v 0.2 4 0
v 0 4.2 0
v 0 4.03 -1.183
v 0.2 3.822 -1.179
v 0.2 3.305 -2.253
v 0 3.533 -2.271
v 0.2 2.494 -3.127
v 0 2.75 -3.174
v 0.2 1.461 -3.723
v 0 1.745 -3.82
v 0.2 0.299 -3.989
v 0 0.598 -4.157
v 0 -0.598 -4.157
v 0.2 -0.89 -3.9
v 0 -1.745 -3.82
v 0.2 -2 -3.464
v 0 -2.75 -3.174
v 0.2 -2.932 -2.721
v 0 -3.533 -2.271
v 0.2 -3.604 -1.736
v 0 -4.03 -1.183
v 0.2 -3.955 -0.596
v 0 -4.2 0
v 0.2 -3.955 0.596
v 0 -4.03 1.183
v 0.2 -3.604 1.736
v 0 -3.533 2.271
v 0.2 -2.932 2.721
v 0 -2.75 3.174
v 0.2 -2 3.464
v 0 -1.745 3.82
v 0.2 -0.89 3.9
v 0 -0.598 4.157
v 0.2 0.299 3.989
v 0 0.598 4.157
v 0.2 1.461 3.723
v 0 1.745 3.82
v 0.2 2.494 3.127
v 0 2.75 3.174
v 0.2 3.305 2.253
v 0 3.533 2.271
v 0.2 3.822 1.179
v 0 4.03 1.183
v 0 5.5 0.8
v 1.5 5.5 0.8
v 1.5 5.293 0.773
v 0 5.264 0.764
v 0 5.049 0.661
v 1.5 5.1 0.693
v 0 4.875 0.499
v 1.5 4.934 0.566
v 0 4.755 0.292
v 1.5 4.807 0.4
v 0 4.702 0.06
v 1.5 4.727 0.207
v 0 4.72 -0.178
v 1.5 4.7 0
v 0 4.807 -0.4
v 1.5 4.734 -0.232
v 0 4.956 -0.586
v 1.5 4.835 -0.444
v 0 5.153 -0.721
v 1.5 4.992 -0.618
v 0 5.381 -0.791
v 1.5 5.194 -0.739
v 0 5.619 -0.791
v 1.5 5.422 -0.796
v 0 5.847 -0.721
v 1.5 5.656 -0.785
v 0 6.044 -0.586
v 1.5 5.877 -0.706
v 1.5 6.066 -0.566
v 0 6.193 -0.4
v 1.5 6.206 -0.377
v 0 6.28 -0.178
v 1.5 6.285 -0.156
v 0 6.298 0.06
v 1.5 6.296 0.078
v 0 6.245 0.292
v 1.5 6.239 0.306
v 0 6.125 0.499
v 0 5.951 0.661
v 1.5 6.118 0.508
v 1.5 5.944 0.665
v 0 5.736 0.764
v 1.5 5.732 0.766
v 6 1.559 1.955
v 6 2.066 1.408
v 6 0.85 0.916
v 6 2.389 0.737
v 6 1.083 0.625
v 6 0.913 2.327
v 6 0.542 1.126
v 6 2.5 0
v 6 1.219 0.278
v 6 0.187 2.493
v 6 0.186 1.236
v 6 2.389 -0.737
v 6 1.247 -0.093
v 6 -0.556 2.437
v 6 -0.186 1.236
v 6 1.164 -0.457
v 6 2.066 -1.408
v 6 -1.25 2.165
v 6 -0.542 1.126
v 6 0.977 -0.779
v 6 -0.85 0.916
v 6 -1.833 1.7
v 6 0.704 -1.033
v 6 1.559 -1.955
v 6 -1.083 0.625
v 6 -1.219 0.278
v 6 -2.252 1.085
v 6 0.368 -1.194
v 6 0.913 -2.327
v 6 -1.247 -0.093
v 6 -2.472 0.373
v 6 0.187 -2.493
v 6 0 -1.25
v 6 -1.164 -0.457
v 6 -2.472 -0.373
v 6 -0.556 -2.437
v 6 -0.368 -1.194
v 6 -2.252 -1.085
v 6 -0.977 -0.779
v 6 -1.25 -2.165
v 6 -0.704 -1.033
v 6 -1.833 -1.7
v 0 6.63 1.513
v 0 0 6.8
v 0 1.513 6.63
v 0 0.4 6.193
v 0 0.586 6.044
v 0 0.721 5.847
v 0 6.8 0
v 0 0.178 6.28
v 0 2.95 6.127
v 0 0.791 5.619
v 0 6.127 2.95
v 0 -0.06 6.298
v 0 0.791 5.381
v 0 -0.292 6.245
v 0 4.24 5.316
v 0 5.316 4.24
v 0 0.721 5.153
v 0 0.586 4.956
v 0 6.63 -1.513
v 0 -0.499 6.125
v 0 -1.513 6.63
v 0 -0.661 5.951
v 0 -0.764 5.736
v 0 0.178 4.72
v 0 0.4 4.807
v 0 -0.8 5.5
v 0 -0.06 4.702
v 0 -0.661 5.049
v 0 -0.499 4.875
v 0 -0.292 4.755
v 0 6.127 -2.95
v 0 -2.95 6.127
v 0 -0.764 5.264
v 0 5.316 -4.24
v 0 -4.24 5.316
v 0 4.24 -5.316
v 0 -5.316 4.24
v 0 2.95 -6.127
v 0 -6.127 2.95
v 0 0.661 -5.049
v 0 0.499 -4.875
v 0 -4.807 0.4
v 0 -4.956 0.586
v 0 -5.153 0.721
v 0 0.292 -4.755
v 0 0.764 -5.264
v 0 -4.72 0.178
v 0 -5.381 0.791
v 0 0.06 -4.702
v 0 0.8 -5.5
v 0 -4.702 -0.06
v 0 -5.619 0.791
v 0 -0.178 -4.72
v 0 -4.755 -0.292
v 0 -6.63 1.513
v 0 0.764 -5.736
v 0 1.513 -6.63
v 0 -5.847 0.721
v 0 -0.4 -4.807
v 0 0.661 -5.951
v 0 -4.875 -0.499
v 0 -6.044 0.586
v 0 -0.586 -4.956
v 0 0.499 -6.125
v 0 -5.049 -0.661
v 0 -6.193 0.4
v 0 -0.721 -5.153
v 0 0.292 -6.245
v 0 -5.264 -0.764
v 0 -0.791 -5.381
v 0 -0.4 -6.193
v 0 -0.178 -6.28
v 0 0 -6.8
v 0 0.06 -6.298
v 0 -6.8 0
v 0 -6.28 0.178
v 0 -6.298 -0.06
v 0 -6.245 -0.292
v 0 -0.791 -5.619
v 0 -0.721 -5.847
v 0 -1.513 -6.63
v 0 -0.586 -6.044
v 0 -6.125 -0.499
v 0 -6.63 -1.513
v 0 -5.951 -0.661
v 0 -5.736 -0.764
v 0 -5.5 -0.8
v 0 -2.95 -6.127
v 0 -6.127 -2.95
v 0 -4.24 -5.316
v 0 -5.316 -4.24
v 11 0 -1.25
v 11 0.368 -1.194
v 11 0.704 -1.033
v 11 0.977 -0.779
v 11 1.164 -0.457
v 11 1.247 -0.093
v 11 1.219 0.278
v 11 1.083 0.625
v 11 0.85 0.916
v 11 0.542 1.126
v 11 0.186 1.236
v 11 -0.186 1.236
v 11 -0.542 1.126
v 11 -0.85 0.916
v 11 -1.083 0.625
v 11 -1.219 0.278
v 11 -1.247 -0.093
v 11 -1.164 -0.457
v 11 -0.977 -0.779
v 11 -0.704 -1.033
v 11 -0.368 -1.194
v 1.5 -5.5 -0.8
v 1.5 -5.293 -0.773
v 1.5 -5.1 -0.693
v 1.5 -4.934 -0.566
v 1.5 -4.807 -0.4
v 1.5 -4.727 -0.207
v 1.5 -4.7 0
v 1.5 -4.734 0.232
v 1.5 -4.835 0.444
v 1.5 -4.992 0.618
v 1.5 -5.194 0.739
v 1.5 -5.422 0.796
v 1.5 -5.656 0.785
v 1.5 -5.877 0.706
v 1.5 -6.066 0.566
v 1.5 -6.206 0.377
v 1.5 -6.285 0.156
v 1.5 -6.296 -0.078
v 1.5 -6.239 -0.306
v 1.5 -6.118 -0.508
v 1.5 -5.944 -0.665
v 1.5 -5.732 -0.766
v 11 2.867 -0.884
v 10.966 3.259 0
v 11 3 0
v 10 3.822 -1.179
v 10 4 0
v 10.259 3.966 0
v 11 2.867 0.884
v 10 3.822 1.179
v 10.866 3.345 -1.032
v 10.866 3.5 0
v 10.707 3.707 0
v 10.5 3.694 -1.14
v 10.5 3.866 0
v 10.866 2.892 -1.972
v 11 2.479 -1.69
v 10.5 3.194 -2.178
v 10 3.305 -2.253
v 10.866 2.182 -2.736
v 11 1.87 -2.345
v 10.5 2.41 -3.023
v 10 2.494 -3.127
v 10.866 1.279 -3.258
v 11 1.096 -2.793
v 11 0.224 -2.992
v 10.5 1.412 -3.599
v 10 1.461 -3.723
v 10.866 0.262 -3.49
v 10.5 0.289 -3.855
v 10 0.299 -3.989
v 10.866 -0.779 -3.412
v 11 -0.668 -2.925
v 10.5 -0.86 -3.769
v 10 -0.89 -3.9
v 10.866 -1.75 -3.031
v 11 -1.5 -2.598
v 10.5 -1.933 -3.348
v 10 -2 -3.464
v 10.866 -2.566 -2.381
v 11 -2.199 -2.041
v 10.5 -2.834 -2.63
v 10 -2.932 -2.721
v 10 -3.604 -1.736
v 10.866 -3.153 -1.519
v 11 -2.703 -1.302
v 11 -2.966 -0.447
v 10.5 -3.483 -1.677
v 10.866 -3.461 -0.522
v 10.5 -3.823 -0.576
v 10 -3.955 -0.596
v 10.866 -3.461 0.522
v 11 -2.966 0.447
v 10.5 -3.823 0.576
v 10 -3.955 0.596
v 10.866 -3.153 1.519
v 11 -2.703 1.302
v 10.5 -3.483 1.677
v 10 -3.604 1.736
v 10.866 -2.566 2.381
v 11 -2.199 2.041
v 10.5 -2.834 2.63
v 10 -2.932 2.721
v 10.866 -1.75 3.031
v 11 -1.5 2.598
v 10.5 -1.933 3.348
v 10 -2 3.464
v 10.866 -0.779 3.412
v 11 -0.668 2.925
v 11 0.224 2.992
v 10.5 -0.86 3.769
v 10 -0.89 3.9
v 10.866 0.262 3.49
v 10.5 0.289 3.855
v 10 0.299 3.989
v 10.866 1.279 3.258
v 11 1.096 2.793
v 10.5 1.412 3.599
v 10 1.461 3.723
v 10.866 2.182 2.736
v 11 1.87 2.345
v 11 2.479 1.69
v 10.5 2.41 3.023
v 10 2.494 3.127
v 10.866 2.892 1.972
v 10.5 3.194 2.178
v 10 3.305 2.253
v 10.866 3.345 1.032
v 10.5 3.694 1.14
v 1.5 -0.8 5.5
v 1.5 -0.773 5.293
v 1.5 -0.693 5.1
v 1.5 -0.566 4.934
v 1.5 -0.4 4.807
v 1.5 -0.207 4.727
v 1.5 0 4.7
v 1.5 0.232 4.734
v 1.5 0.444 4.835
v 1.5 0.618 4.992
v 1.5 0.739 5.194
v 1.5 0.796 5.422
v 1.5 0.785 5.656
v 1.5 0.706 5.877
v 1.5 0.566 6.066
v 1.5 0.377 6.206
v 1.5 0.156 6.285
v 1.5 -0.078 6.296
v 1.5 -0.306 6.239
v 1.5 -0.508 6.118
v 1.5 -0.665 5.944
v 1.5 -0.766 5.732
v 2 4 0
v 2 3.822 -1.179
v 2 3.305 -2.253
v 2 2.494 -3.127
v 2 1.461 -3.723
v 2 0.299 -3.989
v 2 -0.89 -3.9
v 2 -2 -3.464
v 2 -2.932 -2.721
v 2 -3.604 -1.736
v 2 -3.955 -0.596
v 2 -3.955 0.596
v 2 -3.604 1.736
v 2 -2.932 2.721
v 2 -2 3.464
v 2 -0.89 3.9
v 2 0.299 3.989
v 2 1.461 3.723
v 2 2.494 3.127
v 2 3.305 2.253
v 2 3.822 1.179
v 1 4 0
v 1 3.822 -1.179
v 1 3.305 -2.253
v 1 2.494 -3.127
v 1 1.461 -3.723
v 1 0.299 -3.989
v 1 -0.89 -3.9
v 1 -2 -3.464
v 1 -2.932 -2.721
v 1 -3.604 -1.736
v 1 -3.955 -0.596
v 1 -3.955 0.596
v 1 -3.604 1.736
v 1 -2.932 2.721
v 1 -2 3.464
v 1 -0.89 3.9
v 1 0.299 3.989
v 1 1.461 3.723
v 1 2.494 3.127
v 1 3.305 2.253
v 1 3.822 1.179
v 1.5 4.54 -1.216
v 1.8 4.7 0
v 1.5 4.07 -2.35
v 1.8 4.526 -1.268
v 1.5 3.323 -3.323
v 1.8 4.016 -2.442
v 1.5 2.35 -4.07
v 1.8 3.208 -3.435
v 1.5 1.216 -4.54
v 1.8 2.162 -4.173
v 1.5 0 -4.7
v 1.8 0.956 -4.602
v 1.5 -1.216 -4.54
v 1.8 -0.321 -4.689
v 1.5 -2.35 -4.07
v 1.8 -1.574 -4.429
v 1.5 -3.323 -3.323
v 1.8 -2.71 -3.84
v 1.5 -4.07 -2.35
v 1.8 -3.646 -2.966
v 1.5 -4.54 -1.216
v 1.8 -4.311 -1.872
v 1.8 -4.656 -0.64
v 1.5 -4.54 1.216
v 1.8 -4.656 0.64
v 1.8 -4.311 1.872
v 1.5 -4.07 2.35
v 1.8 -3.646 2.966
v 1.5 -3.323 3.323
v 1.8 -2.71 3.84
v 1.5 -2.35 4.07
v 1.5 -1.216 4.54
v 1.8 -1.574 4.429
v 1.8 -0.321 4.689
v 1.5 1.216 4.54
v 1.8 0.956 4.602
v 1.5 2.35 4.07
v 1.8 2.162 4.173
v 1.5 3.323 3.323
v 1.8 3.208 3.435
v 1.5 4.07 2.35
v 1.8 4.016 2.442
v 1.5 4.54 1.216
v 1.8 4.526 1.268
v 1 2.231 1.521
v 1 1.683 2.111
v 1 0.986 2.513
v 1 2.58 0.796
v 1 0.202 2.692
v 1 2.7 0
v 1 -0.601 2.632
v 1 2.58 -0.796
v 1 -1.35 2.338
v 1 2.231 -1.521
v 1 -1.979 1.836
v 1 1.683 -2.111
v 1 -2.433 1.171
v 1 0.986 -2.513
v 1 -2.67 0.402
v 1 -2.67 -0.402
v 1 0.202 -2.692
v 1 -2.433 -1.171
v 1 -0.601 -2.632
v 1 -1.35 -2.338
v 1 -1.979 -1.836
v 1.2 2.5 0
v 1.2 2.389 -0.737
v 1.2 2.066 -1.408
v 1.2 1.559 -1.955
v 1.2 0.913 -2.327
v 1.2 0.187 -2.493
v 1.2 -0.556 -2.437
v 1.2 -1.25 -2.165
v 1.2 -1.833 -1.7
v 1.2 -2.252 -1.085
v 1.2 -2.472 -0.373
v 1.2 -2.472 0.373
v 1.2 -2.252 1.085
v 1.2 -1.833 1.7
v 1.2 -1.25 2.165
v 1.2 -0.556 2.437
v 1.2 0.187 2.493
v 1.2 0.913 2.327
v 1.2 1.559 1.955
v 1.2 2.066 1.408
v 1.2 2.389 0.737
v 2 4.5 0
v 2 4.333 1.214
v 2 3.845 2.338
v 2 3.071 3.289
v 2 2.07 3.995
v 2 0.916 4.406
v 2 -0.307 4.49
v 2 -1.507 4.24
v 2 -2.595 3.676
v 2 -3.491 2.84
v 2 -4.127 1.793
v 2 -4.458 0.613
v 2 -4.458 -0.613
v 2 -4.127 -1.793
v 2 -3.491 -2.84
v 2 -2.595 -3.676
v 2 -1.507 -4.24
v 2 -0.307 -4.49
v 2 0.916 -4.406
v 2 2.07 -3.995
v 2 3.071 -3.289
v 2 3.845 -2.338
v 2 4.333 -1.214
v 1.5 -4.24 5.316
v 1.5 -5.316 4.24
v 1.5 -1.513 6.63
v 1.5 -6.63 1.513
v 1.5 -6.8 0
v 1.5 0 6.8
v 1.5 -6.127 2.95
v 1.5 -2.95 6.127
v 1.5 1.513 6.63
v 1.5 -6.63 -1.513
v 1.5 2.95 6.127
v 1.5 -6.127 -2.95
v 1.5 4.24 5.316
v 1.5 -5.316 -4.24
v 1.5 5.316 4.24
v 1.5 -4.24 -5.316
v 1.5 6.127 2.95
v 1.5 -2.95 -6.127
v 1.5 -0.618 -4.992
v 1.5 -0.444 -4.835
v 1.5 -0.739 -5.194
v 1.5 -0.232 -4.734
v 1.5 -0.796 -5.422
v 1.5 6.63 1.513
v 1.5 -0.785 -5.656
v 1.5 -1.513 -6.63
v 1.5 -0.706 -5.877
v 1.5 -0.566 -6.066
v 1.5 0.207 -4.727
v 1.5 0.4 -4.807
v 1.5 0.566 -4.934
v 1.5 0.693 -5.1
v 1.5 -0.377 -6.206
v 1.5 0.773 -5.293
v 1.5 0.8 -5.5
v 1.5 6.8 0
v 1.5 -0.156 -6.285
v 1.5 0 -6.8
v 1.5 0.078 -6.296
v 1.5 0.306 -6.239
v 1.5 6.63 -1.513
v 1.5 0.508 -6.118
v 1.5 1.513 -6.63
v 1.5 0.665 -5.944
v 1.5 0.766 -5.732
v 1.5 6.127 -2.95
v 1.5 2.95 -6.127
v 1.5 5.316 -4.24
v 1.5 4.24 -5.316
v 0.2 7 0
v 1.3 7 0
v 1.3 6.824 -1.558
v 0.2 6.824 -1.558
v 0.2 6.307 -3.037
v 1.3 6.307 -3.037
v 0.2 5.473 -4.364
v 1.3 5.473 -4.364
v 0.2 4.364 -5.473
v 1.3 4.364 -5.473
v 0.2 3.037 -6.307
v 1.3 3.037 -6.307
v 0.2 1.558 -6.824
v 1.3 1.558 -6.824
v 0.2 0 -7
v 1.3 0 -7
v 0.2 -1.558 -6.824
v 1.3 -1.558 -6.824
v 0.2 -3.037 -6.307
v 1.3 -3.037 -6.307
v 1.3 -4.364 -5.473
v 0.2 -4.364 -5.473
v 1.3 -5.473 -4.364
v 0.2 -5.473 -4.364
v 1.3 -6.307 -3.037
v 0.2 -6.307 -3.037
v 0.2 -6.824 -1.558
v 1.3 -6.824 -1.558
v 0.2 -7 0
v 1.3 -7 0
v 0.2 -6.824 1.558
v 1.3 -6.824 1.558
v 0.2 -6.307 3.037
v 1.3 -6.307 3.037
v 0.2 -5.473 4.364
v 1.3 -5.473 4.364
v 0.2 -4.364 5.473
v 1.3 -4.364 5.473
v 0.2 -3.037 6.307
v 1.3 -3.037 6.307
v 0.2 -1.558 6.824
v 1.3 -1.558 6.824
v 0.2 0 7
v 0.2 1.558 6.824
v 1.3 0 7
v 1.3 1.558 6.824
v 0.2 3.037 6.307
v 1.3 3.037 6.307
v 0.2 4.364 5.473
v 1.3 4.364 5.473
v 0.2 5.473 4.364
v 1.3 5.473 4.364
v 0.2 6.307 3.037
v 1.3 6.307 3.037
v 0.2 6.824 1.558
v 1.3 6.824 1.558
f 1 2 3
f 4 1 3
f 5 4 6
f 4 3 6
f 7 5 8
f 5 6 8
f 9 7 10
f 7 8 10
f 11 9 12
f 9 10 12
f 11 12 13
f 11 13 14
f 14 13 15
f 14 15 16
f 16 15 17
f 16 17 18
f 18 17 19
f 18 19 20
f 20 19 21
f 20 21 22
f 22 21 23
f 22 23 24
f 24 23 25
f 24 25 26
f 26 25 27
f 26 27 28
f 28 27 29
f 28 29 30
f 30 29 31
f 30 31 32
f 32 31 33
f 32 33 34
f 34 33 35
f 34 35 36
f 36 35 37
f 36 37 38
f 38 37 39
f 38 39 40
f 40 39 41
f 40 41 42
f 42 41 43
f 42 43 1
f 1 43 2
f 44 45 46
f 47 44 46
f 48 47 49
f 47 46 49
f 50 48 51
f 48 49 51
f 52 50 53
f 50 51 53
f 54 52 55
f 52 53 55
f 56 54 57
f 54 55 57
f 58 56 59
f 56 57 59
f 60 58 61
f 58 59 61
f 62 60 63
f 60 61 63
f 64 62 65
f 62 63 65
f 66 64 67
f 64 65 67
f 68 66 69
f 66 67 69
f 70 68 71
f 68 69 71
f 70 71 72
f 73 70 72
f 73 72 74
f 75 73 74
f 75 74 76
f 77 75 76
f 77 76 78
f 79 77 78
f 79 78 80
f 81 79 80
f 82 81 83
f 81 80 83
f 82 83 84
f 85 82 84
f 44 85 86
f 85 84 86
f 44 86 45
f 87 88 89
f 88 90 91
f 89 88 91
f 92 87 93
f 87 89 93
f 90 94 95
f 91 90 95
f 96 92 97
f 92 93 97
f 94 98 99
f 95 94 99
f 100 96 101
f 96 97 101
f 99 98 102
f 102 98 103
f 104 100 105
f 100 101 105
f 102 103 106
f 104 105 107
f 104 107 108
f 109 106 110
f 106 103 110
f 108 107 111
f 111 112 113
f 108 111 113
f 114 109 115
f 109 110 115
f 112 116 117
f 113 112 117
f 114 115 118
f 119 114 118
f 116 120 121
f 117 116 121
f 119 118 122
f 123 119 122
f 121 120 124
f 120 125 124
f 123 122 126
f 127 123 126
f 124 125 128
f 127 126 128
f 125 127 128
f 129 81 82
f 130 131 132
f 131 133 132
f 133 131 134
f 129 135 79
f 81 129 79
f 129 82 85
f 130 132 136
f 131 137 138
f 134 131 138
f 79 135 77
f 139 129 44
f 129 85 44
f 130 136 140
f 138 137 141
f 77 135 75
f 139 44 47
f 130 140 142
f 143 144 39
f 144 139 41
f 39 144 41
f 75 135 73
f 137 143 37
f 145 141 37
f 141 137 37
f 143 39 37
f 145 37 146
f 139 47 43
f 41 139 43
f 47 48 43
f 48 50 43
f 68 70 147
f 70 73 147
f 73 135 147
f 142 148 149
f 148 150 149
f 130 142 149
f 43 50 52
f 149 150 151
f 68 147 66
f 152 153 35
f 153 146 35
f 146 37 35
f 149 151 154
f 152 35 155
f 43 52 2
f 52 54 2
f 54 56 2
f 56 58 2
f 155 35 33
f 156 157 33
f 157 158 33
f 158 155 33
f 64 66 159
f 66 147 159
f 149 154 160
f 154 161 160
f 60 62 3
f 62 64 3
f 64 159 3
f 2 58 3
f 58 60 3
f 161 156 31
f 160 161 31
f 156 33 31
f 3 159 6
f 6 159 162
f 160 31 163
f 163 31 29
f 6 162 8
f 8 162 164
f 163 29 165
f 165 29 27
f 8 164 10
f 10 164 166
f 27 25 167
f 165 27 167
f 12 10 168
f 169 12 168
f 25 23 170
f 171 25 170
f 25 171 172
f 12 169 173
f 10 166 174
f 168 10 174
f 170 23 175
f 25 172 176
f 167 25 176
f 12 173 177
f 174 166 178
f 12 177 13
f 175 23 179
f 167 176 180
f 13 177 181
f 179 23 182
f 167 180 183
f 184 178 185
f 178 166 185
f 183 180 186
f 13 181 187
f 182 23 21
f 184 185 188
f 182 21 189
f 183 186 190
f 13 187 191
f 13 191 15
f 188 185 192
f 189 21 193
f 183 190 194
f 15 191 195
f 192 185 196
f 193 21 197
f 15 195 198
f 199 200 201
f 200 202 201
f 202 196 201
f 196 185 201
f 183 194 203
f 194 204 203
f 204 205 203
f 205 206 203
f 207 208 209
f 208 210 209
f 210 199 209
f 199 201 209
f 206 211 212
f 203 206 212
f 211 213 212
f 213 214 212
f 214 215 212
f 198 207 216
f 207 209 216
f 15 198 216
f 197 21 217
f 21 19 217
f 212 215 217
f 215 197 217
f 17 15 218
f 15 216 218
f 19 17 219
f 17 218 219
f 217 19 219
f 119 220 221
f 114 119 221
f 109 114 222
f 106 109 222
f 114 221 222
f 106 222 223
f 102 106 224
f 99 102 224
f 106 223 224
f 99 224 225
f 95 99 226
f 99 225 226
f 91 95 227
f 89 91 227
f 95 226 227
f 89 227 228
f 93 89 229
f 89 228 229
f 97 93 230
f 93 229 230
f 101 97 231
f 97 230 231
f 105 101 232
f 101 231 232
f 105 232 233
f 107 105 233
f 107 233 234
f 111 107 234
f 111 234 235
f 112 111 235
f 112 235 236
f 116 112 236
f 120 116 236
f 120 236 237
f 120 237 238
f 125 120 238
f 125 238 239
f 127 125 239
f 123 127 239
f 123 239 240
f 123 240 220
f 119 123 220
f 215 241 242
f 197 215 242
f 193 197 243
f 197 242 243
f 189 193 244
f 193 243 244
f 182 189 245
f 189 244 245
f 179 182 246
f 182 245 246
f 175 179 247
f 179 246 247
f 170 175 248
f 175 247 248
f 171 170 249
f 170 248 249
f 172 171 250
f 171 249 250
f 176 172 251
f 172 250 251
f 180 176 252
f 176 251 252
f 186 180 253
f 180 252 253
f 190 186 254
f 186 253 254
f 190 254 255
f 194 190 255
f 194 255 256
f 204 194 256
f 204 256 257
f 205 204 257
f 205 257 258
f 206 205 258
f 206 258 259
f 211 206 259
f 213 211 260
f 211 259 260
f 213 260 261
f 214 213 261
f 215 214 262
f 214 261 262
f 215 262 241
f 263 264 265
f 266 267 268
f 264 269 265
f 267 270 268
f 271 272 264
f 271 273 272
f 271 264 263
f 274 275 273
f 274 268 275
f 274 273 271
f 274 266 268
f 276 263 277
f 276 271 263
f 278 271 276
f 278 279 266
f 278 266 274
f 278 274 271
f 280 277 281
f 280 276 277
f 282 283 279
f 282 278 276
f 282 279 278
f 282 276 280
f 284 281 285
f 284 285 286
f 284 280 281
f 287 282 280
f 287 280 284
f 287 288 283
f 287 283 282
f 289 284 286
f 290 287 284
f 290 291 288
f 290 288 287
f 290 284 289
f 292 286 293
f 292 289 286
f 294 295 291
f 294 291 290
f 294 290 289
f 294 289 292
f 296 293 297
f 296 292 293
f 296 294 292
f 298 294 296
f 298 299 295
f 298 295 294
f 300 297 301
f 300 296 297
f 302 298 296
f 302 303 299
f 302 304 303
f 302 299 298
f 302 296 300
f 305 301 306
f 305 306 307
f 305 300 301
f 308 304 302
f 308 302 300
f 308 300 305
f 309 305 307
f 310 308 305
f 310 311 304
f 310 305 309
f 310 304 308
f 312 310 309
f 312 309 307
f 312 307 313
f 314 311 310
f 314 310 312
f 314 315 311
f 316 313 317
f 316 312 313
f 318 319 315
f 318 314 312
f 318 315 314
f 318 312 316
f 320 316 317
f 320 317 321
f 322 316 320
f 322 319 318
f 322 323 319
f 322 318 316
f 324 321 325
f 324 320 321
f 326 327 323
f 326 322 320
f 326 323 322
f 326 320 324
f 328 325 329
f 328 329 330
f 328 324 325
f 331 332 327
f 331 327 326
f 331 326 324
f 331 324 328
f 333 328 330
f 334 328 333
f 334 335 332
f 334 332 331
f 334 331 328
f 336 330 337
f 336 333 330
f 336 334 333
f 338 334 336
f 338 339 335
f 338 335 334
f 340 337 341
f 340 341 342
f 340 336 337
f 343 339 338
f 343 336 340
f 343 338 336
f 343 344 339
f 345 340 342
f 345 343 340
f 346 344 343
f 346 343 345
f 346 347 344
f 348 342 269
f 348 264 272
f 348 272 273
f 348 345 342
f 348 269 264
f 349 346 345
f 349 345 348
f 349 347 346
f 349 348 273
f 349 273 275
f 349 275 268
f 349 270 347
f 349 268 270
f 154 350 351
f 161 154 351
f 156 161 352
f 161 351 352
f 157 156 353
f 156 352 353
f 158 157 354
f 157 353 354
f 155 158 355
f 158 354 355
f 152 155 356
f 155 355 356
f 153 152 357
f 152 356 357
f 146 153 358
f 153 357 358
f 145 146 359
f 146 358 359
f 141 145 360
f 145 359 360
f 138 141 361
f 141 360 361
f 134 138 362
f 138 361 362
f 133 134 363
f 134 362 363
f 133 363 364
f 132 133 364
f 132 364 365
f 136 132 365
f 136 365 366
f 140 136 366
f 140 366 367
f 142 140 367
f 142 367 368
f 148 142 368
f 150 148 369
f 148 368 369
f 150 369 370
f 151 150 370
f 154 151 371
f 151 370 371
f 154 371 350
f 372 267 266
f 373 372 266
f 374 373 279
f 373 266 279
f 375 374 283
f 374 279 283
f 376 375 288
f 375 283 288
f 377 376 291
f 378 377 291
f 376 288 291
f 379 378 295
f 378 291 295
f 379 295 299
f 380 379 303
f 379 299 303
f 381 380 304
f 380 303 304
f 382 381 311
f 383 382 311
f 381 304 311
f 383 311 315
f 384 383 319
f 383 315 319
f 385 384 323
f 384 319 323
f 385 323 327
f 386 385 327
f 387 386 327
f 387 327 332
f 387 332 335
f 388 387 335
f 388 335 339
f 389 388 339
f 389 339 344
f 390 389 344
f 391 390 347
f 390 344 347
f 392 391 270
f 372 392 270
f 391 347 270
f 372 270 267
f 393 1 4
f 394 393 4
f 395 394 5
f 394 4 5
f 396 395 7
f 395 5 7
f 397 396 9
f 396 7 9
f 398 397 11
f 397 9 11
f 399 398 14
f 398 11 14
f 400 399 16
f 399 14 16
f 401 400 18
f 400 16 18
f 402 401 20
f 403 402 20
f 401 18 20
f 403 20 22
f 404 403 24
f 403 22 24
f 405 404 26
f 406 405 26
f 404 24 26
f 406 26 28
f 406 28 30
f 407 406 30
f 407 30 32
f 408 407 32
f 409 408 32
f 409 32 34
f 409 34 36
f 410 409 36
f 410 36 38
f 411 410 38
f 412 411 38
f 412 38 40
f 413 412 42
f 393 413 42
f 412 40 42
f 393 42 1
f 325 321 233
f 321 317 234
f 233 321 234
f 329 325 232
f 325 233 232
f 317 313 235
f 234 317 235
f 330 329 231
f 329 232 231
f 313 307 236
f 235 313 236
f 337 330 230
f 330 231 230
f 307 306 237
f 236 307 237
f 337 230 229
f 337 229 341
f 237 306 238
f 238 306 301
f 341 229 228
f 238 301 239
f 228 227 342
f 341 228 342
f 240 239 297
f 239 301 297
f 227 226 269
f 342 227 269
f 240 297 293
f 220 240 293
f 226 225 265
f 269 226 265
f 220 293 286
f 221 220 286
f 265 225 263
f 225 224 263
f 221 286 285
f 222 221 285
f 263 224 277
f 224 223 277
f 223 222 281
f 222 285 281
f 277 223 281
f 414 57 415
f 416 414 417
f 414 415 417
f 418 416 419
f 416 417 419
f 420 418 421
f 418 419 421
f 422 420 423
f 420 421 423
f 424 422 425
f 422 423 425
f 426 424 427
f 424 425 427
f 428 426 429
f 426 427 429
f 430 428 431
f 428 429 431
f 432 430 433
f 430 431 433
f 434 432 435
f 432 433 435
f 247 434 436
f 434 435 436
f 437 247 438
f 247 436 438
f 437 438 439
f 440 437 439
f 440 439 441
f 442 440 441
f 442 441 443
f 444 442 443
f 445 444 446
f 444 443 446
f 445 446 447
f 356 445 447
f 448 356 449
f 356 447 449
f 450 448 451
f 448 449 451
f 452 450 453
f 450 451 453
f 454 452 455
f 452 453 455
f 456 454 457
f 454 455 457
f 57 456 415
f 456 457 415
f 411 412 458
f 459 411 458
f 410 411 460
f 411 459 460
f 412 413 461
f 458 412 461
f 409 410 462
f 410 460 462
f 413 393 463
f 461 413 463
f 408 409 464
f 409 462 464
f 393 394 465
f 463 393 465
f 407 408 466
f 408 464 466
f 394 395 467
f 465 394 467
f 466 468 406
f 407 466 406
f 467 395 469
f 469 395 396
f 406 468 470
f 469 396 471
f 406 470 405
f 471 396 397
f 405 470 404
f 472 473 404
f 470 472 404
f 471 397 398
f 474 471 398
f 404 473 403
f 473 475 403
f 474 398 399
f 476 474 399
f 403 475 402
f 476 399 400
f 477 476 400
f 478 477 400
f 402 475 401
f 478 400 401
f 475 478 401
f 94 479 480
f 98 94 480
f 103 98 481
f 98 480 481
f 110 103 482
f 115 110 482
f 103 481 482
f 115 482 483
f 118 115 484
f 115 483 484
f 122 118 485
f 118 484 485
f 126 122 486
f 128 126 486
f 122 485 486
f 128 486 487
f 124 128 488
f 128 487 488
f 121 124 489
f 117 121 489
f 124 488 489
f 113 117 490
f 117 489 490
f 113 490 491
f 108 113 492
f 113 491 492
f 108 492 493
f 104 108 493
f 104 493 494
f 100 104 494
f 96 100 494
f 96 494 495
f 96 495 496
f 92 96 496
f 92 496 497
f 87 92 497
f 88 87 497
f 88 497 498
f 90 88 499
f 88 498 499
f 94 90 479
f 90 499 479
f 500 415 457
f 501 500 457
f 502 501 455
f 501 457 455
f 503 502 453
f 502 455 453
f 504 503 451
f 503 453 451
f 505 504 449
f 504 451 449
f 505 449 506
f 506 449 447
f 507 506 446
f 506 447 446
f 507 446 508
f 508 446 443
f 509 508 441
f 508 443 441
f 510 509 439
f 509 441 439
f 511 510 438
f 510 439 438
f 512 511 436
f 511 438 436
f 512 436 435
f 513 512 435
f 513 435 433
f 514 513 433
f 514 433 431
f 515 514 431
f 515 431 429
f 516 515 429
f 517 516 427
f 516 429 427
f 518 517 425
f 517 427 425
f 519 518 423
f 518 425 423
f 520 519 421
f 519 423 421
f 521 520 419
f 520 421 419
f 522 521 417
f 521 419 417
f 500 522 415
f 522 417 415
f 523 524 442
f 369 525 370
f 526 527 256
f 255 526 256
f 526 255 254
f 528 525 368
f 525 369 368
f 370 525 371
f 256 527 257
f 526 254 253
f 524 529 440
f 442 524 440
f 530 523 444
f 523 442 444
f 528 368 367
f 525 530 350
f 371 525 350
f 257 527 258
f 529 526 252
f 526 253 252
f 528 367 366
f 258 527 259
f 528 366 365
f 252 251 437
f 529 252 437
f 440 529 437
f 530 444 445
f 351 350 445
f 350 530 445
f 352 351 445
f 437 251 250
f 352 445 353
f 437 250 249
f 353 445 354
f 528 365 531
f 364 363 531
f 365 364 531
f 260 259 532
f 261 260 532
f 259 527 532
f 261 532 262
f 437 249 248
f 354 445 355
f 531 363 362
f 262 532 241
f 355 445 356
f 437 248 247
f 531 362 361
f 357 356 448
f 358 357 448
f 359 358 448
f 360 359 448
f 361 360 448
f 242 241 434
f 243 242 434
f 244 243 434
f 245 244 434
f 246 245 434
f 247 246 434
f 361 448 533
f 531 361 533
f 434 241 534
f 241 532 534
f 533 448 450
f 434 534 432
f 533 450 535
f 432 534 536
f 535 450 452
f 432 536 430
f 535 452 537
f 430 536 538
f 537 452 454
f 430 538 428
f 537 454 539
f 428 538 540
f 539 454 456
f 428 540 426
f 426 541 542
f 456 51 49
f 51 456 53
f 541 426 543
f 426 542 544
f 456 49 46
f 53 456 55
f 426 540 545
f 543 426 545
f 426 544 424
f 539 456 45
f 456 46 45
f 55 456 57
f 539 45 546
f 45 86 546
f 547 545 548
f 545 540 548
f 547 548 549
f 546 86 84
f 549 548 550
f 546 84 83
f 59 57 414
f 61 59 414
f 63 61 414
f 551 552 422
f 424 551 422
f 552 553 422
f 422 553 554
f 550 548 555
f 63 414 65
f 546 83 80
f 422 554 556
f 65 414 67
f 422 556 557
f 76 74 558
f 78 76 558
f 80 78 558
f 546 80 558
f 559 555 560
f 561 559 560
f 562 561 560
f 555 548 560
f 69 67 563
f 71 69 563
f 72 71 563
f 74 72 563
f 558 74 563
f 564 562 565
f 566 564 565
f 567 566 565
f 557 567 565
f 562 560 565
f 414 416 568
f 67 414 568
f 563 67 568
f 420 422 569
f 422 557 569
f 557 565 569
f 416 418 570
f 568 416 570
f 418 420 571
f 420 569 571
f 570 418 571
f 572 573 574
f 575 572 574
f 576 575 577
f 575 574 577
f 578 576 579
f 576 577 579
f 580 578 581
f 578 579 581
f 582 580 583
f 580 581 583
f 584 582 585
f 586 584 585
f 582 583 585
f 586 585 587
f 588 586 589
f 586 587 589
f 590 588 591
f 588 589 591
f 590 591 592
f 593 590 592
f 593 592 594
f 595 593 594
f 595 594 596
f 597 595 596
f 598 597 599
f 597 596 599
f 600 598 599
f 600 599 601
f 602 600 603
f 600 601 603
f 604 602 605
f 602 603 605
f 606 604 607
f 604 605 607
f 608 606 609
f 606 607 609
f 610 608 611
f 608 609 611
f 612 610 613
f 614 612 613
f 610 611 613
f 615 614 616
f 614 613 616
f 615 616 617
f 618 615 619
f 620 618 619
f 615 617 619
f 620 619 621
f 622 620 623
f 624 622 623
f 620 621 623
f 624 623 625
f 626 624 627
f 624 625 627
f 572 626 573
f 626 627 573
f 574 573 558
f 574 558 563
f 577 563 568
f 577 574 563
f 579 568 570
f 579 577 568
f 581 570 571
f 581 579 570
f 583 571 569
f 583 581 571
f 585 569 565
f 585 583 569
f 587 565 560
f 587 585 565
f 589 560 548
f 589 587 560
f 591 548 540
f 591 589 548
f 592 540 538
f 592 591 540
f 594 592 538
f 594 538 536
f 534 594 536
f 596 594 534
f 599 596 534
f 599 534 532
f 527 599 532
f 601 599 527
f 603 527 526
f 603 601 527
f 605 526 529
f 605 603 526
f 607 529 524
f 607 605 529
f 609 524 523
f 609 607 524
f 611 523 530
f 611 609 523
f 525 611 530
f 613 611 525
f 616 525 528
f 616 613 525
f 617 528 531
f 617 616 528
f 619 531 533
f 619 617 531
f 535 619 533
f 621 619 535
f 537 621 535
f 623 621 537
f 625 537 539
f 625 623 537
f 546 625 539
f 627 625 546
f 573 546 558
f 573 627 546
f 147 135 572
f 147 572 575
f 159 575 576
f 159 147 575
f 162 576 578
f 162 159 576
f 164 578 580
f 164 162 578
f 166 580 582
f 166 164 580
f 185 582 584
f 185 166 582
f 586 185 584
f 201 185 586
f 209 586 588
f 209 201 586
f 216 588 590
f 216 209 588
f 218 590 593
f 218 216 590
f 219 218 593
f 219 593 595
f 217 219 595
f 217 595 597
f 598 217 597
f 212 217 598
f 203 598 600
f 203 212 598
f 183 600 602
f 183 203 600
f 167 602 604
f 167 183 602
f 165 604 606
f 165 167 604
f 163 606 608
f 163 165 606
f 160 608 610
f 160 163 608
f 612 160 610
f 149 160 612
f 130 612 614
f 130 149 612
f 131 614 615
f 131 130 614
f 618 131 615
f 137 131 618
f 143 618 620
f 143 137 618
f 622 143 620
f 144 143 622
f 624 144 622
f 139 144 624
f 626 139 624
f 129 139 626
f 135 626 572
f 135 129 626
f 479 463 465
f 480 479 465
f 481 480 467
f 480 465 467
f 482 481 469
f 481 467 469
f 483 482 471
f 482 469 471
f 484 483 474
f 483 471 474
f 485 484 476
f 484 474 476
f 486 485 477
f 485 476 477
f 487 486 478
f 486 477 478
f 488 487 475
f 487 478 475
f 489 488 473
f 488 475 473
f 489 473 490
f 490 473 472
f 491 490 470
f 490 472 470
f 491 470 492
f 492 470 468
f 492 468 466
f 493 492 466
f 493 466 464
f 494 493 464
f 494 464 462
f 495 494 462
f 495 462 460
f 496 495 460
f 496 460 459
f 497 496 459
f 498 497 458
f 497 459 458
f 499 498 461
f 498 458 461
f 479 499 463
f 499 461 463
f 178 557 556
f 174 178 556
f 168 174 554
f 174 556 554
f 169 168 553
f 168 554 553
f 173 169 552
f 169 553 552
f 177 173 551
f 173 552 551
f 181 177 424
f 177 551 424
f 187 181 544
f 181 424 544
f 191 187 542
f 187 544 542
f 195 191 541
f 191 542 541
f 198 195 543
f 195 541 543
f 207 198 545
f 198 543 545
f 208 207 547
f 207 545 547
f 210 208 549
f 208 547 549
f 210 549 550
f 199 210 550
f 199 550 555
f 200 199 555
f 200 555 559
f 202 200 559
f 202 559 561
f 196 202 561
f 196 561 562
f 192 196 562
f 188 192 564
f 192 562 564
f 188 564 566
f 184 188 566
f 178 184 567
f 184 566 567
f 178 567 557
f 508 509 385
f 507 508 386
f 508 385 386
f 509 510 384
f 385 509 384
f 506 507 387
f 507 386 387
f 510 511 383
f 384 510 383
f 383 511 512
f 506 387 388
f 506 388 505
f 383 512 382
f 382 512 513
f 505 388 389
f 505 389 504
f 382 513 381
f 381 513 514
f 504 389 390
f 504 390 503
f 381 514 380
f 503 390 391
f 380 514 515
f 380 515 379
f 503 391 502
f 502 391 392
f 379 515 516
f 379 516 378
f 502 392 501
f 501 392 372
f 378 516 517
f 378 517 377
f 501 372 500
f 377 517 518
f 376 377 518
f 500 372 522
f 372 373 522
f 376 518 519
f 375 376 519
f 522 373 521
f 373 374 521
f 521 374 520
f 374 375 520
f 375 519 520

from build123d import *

# Parameters (mm, degrees)
HOLE_WIZARD_M3_1_D       = 2.5
FILLET_1_R               = 1
CHAMFER_1_SIZE           = 0.2
HOLE_WIZARD_M2_1_D       = 1.6
PATTERN_CIRCULAR_1_COUNT = 4
CHAMFER_2_SIZE           = 0.2


with BuildPart() as part:
    # 草图1 → 旋转1 (revolve)
    with BuildSketch(Plane.XY):
        Polygon((11, 0), (6, 0), (6, 2.5), (1, 2.5), (1, 4), (0, 4), (0, 7), (1.5, 7), (1.5, 4.7), (2, 4.7), (2, 4), (11, 4), align=None)
    revolve(axis=Axis((11, 0, 0), (-1, 0, 0)))

    # M3 螺纹孔1 (through all)
    with Locations(Plane.ZY.offset(-6)):
        with Locations((0, 0)):
            Hole(HOLE_WIZARD_M3_1_D / 2)

    # 圆角1
    fillet_1_edges = [part.edges().sort_by_distance(p)[0] for p in [
        (11, -4, 0),
    ]]
    fillet(fillet_1_edges, radius=FILLET_1_R)

    # 倒角1
    chamfer_1_edges = [part.edges().sort_by_distance(p)[0] for p in [
        (1.5, -7, 0),
        (0, -7, 0),
        (0, -4, 0),
        (1, -2.5, 0),
    ]]
    chamfer(chamfer_1_edges, length=CHAMFER_1_SIZE)

    # M2 螺纹孔1 (through all)
    with Locations(Plane.ZY):
        with Locations((0, -5.5)):
            hole_wizard_m2_1 = Hole(HOLE_WIZARD_M2_1_D / 2)

    # 阵列(圆周)1: M2 螺纹孔1 ×4 about axis
    pattern_circular_1_axis = Axis((0, 0, 0), (1, 0, 0))
    for i in range(1, PATTERN_CIRCULAR_1_COUNT):
        add(hole_wizard_m2_1.rotate(pattern_circular_1_axis, i * 360 / PATTERN_CIRCULAR_1_COUNT), mode=Mode.SUBTRACT)

    # 倒角2
    chamfer_2_edges = [part.edges().sort_by_distance(p)[0] for p in [
        (2, -4.7, 0),
    ]]
    chamfer(chamfer_2_edges, length=CHAMFER_2_SIZE)


solid = part.part
